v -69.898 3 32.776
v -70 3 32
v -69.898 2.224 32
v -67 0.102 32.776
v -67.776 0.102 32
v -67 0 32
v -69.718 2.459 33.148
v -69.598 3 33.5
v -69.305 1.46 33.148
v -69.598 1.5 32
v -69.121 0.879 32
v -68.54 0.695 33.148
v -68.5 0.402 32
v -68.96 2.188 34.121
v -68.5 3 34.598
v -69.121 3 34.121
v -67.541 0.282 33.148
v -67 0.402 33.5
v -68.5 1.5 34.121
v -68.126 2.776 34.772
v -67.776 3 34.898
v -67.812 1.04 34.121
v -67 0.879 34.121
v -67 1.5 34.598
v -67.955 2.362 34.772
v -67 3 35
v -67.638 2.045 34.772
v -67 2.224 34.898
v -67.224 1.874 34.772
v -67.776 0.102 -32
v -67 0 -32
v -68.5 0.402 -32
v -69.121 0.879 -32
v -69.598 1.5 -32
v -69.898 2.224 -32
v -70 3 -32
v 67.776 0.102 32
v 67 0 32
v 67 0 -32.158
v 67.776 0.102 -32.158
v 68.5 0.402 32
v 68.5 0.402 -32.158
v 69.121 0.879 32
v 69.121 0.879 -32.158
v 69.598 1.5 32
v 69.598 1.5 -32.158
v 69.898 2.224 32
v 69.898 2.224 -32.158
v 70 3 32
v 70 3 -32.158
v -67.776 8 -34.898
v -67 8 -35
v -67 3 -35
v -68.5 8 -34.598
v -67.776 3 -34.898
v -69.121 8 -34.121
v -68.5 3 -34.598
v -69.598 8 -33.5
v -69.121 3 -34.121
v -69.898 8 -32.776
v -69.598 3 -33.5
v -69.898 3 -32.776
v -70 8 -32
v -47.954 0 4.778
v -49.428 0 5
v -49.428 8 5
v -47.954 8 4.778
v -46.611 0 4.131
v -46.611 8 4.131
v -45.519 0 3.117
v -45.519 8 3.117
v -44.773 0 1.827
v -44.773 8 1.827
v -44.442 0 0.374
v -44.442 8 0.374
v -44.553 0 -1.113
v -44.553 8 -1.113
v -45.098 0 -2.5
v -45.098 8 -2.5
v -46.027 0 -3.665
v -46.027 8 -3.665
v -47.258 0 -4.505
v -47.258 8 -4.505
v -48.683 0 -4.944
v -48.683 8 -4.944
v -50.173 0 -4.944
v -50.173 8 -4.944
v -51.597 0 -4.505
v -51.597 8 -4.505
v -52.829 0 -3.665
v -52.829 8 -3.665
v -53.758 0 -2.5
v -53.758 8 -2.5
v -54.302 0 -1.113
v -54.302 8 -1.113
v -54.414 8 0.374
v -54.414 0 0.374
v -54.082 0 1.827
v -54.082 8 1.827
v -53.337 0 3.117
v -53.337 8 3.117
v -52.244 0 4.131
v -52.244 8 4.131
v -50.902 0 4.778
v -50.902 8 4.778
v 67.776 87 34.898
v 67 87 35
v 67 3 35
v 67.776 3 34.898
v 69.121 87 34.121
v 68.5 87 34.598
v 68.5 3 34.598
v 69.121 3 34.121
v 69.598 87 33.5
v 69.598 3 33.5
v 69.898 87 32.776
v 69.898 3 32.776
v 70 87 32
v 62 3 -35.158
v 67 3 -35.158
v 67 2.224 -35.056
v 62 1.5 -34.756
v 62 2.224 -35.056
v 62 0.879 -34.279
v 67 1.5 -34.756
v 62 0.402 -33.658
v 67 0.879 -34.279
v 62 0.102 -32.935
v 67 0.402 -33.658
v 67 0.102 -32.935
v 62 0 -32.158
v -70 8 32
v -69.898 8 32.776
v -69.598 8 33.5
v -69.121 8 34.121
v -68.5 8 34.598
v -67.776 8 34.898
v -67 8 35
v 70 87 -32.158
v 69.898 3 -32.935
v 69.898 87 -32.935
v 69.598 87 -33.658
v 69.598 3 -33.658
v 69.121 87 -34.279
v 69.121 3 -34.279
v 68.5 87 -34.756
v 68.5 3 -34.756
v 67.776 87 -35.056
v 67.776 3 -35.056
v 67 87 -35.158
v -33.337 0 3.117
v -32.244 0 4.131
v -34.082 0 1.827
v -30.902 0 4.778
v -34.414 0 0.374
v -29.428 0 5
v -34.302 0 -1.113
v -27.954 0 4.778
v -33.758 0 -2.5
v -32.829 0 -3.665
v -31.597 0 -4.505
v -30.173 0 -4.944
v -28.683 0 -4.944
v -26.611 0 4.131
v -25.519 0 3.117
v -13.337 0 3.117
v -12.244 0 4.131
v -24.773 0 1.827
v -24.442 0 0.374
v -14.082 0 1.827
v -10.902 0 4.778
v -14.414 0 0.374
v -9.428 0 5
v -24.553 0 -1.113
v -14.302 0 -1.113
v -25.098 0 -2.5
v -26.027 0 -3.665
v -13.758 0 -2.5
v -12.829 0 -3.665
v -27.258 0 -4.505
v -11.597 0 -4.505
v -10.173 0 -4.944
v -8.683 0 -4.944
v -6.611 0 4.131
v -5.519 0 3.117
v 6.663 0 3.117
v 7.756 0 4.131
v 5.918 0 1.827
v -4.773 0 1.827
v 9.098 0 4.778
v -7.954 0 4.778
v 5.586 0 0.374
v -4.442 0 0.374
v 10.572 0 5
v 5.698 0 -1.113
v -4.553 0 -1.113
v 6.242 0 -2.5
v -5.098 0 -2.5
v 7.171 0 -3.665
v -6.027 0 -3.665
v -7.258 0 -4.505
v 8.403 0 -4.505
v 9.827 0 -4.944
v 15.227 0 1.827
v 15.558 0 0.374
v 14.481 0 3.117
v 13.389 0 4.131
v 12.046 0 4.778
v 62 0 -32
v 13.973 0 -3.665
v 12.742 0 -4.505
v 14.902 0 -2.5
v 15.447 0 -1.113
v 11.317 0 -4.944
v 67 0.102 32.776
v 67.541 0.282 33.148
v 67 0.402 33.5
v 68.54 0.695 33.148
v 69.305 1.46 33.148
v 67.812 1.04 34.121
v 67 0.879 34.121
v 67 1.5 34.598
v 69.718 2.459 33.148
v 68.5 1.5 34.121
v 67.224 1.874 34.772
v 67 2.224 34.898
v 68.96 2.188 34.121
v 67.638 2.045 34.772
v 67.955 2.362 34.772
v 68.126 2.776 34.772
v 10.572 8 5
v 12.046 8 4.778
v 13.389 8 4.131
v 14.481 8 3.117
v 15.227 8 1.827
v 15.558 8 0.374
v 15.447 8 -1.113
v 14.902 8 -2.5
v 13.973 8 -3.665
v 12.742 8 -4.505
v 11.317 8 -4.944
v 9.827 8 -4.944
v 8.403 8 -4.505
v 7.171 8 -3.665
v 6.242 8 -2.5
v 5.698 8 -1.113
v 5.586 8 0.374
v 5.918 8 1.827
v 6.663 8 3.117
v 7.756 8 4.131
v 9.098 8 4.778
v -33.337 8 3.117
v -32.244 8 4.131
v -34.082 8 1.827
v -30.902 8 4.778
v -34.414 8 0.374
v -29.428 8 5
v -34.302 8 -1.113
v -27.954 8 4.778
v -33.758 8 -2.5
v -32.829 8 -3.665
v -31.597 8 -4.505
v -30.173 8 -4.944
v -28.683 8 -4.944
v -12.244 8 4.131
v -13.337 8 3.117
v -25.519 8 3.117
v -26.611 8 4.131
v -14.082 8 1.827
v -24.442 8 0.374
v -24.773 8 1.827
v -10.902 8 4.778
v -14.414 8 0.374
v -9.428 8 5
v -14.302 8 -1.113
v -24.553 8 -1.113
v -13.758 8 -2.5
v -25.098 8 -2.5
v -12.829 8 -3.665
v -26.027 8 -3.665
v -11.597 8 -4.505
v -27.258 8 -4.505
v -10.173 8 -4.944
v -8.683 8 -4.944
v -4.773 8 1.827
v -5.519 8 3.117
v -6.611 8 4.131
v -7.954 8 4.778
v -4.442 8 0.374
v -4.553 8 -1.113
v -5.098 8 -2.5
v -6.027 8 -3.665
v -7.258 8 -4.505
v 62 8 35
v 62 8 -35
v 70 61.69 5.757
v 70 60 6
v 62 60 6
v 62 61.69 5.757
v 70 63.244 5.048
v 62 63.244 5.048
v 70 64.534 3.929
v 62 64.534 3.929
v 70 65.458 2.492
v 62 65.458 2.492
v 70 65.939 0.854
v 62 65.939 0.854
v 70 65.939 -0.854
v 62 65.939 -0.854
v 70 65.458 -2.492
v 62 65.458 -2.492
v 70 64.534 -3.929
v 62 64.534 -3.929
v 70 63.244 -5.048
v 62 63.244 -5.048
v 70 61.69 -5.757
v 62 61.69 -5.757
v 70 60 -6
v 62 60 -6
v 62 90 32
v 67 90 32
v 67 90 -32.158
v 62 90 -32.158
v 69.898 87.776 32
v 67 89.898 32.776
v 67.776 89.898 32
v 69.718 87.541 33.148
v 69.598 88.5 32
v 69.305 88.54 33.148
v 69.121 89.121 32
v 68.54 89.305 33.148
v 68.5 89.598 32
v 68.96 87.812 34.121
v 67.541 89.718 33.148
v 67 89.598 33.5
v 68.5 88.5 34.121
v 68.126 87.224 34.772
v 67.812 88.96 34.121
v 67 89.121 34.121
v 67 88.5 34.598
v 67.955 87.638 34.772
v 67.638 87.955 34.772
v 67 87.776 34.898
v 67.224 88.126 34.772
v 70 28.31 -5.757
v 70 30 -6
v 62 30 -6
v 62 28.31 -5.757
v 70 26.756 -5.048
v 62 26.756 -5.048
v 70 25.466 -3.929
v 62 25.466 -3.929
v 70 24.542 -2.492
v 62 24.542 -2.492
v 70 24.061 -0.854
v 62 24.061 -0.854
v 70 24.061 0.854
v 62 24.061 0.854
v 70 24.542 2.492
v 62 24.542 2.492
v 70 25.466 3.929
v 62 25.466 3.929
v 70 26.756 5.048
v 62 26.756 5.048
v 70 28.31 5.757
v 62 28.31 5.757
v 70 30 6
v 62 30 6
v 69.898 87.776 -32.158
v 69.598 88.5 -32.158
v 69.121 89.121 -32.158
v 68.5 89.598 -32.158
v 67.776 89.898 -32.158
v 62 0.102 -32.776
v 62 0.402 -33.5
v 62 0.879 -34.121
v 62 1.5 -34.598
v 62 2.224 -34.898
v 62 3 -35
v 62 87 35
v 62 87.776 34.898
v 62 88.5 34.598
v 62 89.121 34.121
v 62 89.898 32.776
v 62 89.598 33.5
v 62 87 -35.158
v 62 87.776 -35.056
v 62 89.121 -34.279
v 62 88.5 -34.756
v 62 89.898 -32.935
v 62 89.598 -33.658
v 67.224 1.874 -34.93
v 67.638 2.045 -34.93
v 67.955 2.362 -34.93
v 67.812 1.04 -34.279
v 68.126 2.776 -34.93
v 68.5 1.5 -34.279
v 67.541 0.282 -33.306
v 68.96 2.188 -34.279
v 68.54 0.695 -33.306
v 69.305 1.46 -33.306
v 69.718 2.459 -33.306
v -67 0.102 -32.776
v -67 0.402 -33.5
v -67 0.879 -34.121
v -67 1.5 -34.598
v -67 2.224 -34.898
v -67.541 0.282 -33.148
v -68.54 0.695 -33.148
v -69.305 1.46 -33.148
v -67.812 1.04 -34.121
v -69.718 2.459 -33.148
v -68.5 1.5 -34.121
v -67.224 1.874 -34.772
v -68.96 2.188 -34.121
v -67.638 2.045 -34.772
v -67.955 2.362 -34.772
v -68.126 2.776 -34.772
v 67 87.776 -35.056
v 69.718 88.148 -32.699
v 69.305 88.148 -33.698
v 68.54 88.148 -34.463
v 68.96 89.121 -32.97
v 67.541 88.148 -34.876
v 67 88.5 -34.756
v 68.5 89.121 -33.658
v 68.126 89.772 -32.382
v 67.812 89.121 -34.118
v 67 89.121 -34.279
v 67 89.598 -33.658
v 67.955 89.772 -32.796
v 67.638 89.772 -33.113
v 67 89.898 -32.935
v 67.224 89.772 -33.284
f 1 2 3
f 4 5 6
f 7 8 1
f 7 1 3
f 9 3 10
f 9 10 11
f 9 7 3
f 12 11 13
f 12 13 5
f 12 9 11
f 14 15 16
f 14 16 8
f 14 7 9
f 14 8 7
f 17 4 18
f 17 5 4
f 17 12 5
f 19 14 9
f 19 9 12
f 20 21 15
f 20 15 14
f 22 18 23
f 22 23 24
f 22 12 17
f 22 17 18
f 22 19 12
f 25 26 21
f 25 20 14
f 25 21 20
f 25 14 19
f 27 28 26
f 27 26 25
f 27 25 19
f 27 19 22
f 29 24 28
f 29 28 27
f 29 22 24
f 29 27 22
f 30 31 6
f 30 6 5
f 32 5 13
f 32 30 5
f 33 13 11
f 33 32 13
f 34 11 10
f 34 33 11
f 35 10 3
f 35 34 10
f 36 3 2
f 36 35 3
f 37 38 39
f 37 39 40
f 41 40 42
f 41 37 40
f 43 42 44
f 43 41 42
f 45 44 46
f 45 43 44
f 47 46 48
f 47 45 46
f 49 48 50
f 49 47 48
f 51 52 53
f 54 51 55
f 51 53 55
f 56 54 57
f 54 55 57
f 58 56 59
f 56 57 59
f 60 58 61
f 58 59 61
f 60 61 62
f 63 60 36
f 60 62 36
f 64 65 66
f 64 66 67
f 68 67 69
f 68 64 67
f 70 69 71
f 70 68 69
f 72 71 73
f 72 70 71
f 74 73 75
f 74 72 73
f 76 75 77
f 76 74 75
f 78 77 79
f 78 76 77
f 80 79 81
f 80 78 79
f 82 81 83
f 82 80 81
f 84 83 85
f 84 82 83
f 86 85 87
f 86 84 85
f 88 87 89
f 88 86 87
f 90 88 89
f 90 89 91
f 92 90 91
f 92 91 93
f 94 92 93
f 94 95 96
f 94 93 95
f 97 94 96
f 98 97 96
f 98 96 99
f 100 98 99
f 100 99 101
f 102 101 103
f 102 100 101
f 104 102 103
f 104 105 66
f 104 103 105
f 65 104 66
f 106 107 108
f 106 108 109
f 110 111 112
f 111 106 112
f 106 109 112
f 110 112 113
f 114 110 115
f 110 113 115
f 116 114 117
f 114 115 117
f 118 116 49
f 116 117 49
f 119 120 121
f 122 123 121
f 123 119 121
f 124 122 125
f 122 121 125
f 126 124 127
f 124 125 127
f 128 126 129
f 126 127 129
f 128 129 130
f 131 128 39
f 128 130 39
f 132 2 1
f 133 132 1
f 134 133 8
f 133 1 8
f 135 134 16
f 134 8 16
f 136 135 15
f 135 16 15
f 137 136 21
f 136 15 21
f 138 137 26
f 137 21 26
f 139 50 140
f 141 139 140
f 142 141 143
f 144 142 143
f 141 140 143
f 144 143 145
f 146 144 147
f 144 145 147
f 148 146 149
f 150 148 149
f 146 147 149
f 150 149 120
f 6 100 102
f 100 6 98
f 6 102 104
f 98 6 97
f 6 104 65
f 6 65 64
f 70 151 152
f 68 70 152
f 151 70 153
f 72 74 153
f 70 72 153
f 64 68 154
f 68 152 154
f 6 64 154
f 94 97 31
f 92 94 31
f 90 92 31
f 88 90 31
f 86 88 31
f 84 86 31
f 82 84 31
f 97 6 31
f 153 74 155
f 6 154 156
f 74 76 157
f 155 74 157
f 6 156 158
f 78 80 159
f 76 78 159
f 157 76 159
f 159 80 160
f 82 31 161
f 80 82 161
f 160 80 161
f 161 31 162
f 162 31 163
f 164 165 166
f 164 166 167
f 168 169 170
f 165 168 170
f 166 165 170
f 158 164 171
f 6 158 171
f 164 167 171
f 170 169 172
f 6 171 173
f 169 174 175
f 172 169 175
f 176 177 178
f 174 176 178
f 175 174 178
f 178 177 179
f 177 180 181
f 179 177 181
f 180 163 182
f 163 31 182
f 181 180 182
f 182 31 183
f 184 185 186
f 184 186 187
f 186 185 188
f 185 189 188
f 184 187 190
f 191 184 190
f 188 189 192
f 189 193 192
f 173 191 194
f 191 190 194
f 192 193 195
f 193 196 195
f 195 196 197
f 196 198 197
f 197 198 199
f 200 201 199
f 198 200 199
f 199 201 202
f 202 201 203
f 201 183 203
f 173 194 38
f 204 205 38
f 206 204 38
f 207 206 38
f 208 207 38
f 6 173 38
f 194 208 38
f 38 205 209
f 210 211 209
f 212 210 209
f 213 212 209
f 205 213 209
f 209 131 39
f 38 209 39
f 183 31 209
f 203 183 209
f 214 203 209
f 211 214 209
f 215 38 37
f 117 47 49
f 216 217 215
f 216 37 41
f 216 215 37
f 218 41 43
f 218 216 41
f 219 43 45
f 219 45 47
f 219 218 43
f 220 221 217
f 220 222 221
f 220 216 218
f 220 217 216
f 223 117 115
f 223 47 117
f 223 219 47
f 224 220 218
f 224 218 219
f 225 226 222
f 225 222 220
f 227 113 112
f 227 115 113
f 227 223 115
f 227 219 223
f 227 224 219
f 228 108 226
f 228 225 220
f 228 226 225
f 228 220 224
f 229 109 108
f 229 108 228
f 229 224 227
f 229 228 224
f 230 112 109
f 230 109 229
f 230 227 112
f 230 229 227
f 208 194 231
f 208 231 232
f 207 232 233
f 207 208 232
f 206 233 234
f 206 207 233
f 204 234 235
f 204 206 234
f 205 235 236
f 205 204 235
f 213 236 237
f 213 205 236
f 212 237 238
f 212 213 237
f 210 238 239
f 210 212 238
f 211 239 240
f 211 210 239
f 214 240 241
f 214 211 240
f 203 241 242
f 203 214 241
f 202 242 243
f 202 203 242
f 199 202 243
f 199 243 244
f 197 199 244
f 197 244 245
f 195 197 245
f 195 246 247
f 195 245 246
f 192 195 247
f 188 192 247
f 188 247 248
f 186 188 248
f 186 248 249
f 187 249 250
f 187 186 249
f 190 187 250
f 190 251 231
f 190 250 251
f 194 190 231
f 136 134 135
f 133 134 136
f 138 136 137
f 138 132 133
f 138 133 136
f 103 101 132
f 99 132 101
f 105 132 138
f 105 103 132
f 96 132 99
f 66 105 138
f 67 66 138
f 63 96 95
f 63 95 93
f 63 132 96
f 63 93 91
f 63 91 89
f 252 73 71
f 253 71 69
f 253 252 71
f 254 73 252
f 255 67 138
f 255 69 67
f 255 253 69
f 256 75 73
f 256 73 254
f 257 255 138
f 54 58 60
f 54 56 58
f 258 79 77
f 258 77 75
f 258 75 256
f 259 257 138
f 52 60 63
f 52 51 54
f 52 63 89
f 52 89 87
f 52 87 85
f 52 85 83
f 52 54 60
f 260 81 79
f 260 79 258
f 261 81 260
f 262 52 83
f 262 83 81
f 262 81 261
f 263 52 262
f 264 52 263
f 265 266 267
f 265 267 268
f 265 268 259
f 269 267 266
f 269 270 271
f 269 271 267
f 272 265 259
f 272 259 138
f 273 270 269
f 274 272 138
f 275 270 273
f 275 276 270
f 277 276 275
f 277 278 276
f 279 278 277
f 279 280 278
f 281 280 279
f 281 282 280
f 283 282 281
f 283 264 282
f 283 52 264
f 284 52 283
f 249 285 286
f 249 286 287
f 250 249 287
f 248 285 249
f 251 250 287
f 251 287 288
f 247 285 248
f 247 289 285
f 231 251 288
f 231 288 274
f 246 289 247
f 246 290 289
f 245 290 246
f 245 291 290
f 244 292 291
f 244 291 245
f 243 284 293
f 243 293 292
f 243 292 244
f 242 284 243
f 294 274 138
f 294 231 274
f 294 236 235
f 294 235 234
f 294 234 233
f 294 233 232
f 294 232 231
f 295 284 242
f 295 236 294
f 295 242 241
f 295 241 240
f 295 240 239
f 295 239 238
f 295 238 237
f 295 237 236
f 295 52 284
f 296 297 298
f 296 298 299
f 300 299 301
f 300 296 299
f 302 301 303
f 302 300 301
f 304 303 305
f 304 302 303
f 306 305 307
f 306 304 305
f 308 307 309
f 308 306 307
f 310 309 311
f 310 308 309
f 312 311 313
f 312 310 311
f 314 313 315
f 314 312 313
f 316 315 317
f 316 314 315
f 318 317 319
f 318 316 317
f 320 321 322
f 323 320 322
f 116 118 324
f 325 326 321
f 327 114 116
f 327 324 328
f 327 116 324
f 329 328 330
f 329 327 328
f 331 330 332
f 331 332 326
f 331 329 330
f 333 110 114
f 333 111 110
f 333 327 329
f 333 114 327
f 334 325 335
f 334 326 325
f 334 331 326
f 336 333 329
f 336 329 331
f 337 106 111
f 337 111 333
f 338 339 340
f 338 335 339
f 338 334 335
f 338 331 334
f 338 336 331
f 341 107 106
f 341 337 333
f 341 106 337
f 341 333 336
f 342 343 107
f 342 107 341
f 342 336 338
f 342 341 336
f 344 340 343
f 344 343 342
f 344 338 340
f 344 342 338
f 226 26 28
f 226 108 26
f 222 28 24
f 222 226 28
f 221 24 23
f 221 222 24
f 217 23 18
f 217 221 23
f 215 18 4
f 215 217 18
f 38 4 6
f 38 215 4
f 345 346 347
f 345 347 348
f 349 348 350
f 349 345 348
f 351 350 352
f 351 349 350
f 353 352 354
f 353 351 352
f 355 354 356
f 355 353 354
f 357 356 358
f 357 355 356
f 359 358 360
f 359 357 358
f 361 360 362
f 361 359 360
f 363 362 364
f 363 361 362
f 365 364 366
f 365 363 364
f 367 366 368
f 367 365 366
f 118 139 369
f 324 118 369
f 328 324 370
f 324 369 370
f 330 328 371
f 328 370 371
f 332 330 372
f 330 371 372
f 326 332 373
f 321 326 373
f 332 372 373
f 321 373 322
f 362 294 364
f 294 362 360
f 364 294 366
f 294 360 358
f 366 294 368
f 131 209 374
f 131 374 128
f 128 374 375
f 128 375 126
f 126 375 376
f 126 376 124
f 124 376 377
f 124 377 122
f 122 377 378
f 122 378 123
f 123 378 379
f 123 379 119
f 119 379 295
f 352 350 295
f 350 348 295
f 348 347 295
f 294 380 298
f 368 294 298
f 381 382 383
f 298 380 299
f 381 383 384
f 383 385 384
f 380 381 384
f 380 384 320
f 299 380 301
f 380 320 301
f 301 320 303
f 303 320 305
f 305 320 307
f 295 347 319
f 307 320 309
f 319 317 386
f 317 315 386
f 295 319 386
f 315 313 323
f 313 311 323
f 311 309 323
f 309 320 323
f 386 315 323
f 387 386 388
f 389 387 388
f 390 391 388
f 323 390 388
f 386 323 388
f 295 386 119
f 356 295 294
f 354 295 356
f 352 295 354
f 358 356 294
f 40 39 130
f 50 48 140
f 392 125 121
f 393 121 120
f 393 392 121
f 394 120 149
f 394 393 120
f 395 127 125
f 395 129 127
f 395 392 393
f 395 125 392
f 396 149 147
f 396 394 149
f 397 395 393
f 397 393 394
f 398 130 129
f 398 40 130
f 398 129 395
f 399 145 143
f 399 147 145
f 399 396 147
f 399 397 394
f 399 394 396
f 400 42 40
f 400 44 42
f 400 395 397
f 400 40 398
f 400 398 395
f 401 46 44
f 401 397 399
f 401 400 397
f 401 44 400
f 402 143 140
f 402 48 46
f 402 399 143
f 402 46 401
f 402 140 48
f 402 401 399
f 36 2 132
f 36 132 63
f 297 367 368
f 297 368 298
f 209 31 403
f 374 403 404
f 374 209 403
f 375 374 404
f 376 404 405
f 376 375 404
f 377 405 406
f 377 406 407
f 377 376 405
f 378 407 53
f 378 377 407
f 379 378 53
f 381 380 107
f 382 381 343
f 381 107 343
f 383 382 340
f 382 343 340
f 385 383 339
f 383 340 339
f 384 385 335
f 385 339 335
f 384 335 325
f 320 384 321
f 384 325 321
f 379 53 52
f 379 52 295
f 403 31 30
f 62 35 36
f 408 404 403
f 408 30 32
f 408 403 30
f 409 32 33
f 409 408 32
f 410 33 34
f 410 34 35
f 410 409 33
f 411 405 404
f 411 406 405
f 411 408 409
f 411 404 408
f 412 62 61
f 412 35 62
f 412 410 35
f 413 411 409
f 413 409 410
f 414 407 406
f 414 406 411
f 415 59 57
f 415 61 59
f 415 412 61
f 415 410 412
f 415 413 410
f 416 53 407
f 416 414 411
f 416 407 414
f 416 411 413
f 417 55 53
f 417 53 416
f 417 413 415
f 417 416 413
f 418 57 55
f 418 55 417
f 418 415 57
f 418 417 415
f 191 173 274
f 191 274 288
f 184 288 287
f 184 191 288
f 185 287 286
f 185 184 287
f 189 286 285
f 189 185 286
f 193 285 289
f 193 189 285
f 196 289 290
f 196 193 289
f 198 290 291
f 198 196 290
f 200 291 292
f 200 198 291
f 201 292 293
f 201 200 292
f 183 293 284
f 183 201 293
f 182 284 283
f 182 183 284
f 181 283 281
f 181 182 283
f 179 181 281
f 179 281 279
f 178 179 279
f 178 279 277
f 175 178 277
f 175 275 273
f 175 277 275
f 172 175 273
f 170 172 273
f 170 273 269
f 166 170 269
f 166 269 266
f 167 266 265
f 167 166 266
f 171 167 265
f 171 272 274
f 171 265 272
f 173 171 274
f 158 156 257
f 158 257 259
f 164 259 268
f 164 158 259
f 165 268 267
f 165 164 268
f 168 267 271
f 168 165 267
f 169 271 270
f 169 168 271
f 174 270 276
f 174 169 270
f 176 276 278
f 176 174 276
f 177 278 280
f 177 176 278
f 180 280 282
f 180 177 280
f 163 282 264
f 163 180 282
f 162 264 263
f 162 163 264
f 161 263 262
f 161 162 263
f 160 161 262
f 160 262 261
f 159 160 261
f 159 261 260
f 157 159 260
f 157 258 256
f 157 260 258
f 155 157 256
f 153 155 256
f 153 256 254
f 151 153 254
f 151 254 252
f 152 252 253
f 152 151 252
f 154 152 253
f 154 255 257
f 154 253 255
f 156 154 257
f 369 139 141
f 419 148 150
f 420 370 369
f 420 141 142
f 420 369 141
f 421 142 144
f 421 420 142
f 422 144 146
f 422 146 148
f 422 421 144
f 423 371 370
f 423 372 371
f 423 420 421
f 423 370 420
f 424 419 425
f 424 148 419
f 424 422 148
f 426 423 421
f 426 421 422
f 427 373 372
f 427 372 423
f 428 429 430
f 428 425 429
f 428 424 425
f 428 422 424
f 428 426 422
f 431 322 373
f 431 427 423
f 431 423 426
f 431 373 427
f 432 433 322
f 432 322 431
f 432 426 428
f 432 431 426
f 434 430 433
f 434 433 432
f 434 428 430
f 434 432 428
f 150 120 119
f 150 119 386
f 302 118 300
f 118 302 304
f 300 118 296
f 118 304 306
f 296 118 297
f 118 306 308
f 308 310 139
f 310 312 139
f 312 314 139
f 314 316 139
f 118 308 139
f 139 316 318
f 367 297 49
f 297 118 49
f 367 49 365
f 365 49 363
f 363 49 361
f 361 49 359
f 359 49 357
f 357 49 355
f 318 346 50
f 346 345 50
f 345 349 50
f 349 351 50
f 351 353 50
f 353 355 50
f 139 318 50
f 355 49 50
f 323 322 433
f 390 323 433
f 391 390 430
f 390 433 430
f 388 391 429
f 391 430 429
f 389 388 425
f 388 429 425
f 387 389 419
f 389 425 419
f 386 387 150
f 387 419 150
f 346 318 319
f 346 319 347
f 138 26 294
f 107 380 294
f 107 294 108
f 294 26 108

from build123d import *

# Parameters (mm, degrees)
SKETCH1_W               = 140
SKETCH1_H               = 70
BASE_EXTRUDE_DEPTH      = 8
SKETCH2_W               = 70.158062676
SKETCH2_H               = 90
VERTICAL_FLANGE_DEPTH   = 8
ADUJUSTMENT_SLOT_DEPTH  = 171.106112092
HOLE_PATTERN_DEPTH      = 114.402334064
HOLE_PATTERN_DEPTH_BACK = 114.402334064
SKETCH6_R               = 5
FILLET1_R               = 3
FILLET2_R               = 3
FILLET3_R               = 3


with BuildPart() as part:
    # Sketch1 → Base Extrude (new body)
    with BuildSketch(Plane(origin=(0, 0, 0), x_dir=(1, 0, 0), z_dir=(0, 1, 0))):
        Rectangle(SKETCH1_W, SKETCH1_H)
    extrude(amount=BASE_EXTRUDE_DEPTH)

    # Sketch2 → vertical flange (add)
    with BuildSketch(Plane(origin=(70, 0, 0), x_dir=(0, 0, -1), z_dir=(1, 0, 0))):
        with Locations((0.079031338, 45)):
            Rectangle(SKETCH2_W, SKETCH2_H)
    extrude(amount=-VERTICAL_FLANGE_DEPTH)

    # Sketch3 → adujustment slot (cut, through all)
    with BuildSketch(Plane(origin=(70, 0, 0), x_dir=(0, 0, -1), z_dir=(1, 0, 0))):
        with BuildLine():
            Line((6, 60), (6, 30))
            ThreePointArc((6, 30), (0, 24), (-6, 30))
            Line((-6, 30), (-6, 60))
            ThreePointArc((-6, 60), (0, 66), (6, 60))
        make_face()
    extrude(amount=-ADUJUSTMENT_SLOT_DEPTH, mode=Mode.SUBTRACT)

    # Sketch6 → Hole_Pattern (cut, two sides: drawn at the far end of the back side and taken through both)
    with BuildSketch(Plane(origin=(0, 8, 0), x_dir=(1, 0, 0), z_dir=(0, 1, 0)).offset(-HOLE_PATTERN_DEPTH_BACK)):
        with Locations(Location((-49.427742691, 0, 0), (0, 0, 270))):
            Circle(SKETCH6_R)
        with Locations(Location((-29.427742691, 0, 0), (0, 0, 270))):
            Circle(SKETCH6_R)
        with Locations(Location((-9.427742691, 0, 0), (0, 0, 270))):
            Circle(SKETCH6_R)
        with Locations(Location((10.572257309, 0, 0), (0, 0, 270))):
            Circle(SKETCH6_R)
    extrude(amount=HOLE_PATTERN_DEPTH + HOLE_PATTERN_DEPTH_BACK, mode=Mode.SUBTRACT)

    # Fillet1
    fillet1_edges = [part.edges().sort_by_distance(p)[0] for p in [
        (-4, 0, -35),
        (0, 0, 35),
        (-70, 0, 0),
        (70, 0, -0.079031338),
    ]]
    fillet(fillet1_edges, radius=FILLET1_R)

    # Fillet2
    # the kernel refuses this fillet: 3 mm, written as the material it takes off along each edge
    with BuildSketch(Plane(origin=(-67, 3, 32), x_dir=(-1, 0, 0), z_dir=(0, 0, 1))) as fillet2_piece_1_section:
        Polygon((0, 0), (FILLET2_R, 0), (FILLET2_R, FILLET2_R), (0, FILLET2_R), align=None)
    fillet2_piece_1 = extrude(amount=FILLET2_R, mode=Mode.PRIVATE)
    fillet2_piece_1 = fillet2_piece_1 - Plane(origin=(-67, 3, 32), x_dir=(0.7071067811865475, 0.7071067811865475, 0), z_dir=(0, 0, 1)) * Sphere(FILLET2_R, mode=Mode.PRIVATE)
    add(fillet2_piece_1, mode=Mode.SUBTRACT)
    with BuildSketch(Plane(origin=(67, 3, 32), x_dir=(1, 0, 0), z_dir=(0, 0, 1))) as fillet2_piece_2_section:
        Polygon((0, 0), (FILLET2_R, 0), (FILLET2_R, -FILLET2_R), (0, -FILLET2_R), align=None)
    fillet2_piece_2 = extrude(amount=FILLET2_R, mode=Mode.PRIVATE)
    fillet2_piece_2 = fillet2_piece_2 - Plane(origin=(67, 3, 32), x_dir=(-0.7071067811865475, 0.7071067811865475, 0), z_dir=(0, 0, 1)) * Sphere(FILLET2_R, mode=Mode.PRIVATE)
    add(fillet2_piece_2, mode=Mode.SUBTRACT)
    with BuildSketch(Plane(origin=(67, 87, -32.158062676), x_dir=(0, 0, -1), z_dir=(0, 1, 0))) as fillet2_piece_3_section:
        Polygon((0, 0), (FILLET2_R, 0), (FILLET2_R, -FILLET2_R), (0, -FILLET2_R), align=None)
    fillet2_piece_3 = extrude(amount=FILLET2_R, mode=Mode.PRIVATE)
    fillet2_piece_3 = fillet2_piece_3 - Plane(origin=(67, 87, -32.158062676), x_dir=(-0.7071067811865475, 0, 0.7071067811865475), z_dir=(0, 1, 0)) * Sphere(FILLET2_R, mode=Mode.PRIVATE)
    add(fillet2_piece_3, mode=Mode.SUBTRACT)
    with BuildSketch(Plane(origin=(67, 87, 32), x_dir=(0, 1, 0), z_dir=(0, 0, 1))) as fillet2_piece_4_section:
        Polygon((0, 0), (FILLET2_R, 0), (FILLET2_R, -FILLET2_R), (0, -FILLET2_R), align=None)
    fillet2_piece_4 = extrude(amount=FILLET2_R, mode=Mode.PRIVATE)
    fillet2_piece_4 = fillet2_piece_4 - Plane(origin=(67, 87, 32), x_dir=(-0.7071067811865475, -0.7071067811865475, 0), z_dir=(0, 0, 1)) * Sphere(FILLET2_R, mode=Mode.PRIVATE)
    add(fillet2_piece_4, mode=Mode.SUBTRACT)
    with BuildSketch(Plane(origin=(67, 0, -35.158062676), x_dir=(0, 1, 0), z_dir=(-1, 0, 0)), Plane(origin=(67, 90, 35), x_dir=(0, -1, 0), z_dir=(-1, 0, 0)), Plane(origin=(67, 90, -35.158062676), x_dir=(0, 0, 1), z_dir=(-1, 0, 0))) as fillet2_piece_5:
        with BuildLine():
            CenterArc((FILLET2_R, -FILLET2_R), FILLET2_R, 90, 90)
            Line((0, -FILLET2_R), (0, 0))
            Line((0, 0), (FILLET2_R, 0))
        make_face()
    extrude(amount=12.5, mode=Mode.SUBTRACT)
    with BuildSketch(Plane(origin=(70, 90, -32.158062676), x_dir=(-1, 0, 0), z_dir=(0, 0, 1))) as fillet2_piece_6:
        with BuildLine():
            CenterArc((FILLET2_R, FILLET2_R), FILLET2_R, 180, 90)
            Line((0, FILLET2_R), (0, 0))
            Line((0, 0), (FILLET2_R, 0))
        make_face()
    extrude(amount=64.158062676, mode=Mode.SUBTRACT)
    with BuildSketch(Plane(origin=(70, 3, -35.158062676), x_dir=(-1, 0, 0), z_dir=(0, 1, 0))) as fillet2_piece_7:
        with BuildLine():
            CenterArc((FILLET2_R, FILLET2_R), FILLET2_R, 180, 90)
            Line((0, FILLET2_R), (0, 0))
            Line((0, 0), (FILLET2_R, 0))
        make_face()
    extrude(amount=84, mode=Mode.SUBTRACT)
    with BuildSketch(Plane(origin=(67, 3, -35.158062676), x_dir=(0, -1, 0), z_dir=(-1, 0, 0))) as fillet2_piece_8:
        with BuildLine():
            CenterArc((3 - FILLET2_R, FILLET2_R), FILLET2_R, 270, 90)
            Line((3, FILLET2_R), (3, 0))
            Line((3, 0), (3 - FILLET2_R, 0))
        make_face()
    revolve(axis=Axis((67, 3, -35.158062676), (0, 0, 1)), revolution_arc=90, mode=Mode.SUBTRACT)
    with BuildSketch(Plane(origin=(70, 3, 35), x_dir=(-1, 0, 0), z_dir=(0, 1, 0))) as fillet2_piece_9:
        with BuildLine():
            CenterArc((FILLET2_R, -FILLET2_R), FILLET2_R, 90, 90)
            Line((0, -FILLET2_R), (0, 0))
            Line((0, 0), (FILLET2_R, 0))
        make_face()
    extrude(amount=84, mode=Mode.SUBTRACT)
    with BuildSketch(Plane(origin=(-70, 3, 35), x_dir=(1, 0, 0), z_dir=(0, 1, 0))) as fillet2_piece_10:
        with BuildLine():
            CenterArc((FILLET2_R, FILLET2_R), FILLET2_R, 180, 90)
            Line((0, FILLET2_R), (0, 0))
            Line((0, 0), (FILLET2_R, 0))
        make_face()
    extrude(amount=12.5, mode=Mode.SUBTRACT)

    # Fillet3
    # the kernel refuses this fillet: 3 mm, written as the material it takes off along each edge
    with BuildSketch(Plane(origin=(-67, 3, -32), x_dir=(-1, 0, 0), z_dir=(0, 0, -1))) as fillet3_piece_1_section:
        Polygon((0, 0), (FILLET3_R, 0), (FILLET3_R, -FILLET3_R), (0, -FILLET3_R), align=None)
    fillet3_piece_1 = extrude(amount=FILLET3_R, mode=Mode.PRIVATE)
    fillet3_piece_1 = fillet3_piece_1 - Plane(origin=(-67, 3, -32), x_dir=(0.7071067811865475, 0.7071067811865475, 0), z_dir=(0, 0, -1)) * Sphere(FILLET3_R, mode=Mode.PRIVATE)
    add(fillet3_piece_1, mode=Mode.SUBTRACT)
    with BuildSketch(Plane(origin=(-70, 3, -35), x_dir=(1, 0, 0), z_dir=(0, 1, 0))) as fillet3_piece_2:
        with BuildLine():
            CenterArc((FILLET3_R, -FILLET3_R), FILLET3_R, 90, 90)
            Line((0, -FILLET3_R), (0, 0))
            Line((0, 0), (FILLET3_R, 0))
        make_face()
    extrude(amount=12.5, mode=Mode.SUBTRACT)


solid = part.part
